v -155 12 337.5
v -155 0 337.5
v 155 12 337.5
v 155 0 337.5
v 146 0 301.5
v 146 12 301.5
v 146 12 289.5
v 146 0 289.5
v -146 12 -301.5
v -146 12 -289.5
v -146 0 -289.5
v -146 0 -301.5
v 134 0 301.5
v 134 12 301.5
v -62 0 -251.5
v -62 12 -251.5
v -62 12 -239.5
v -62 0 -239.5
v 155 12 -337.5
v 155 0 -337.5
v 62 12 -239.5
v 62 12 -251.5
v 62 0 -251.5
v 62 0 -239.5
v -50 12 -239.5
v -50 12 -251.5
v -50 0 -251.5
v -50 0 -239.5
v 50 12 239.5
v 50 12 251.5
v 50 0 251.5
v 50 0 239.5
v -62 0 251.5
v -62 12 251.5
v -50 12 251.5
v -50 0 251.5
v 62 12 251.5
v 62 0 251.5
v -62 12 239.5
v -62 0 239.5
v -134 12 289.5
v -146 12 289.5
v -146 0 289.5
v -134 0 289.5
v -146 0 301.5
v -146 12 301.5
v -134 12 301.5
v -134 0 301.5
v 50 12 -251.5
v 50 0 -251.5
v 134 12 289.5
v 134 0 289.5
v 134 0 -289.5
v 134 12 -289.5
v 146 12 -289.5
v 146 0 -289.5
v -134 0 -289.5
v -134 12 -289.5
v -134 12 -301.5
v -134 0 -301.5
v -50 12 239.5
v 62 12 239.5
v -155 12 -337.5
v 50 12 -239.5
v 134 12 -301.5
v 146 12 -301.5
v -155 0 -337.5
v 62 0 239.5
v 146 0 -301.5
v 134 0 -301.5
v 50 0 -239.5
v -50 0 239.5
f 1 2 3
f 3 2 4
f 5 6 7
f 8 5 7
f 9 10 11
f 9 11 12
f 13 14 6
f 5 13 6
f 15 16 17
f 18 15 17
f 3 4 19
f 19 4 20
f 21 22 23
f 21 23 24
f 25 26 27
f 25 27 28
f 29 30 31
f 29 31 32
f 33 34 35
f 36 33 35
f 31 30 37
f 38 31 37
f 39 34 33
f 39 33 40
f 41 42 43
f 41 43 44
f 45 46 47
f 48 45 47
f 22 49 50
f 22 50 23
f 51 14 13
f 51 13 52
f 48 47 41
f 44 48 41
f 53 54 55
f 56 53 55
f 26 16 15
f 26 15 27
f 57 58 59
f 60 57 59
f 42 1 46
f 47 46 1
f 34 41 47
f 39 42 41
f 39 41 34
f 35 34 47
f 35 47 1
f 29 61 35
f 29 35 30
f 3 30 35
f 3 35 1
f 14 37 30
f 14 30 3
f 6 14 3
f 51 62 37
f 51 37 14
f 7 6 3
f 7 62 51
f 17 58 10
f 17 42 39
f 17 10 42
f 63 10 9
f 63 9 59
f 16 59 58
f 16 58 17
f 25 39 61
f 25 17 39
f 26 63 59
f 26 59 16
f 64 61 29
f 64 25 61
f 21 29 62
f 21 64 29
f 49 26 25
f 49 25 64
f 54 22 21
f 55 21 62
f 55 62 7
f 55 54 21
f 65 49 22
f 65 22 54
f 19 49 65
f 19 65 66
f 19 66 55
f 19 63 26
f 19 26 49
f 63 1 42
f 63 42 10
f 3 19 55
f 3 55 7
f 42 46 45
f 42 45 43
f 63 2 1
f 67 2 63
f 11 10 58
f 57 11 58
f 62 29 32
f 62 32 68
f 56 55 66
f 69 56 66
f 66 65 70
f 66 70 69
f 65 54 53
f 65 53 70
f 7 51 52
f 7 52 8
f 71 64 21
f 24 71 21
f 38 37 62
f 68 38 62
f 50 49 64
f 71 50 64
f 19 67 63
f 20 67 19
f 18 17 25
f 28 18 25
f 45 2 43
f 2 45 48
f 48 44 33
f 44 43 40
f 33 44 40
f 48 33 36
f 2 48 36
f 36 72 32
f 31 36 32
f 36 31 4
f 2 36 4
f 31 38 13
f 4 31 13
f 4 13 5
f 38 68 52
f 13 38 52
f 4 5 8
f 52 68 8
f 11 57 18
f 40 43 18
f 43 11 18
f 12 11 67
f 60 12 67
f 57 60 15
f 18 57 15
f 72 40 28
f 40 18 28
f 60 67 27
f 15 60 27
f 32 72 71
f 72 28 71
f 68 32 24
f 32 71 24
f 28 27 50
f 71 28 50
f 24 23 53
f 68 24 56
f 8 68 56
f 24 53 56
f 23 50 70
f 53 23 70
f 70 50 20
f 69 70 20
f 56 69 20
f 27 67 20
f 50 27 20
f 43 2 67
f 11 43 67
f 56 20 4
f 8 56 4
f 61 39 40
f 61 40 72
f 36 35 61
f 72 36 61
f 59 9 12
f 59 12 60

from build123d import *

# Parameters (mm, degrees)
SKETCH1_W           = 310
SKETCH1_H           = 675
SKETCH1_W_2         = 300
SKETCH1_H_2         = 665
SKETCH1_W_3         = 260
SKETCH1_H_3         = 625
BOSS_EXTRUDE1_DEPTH = 12
SKETCH2_W           = 12
SKETCH2_H           = 12
CUT_EXTRUDE1_DEPTH  = 13
SKETCH3_W           = 12
SKETCH3_H           = 12
CUT_EXTRUDE2_DEPTH  = 13


with BuildPart() as part:
    # Sketch1 → Boss-Extrude1 (new body)
    with BuildSketch(Plane(origin=(0, 0, 0), x_dir=(1, 0, 0), z_dir=(0, 1, 0))):
        Rectangle(SKETCH1_W, SKETCH1_H)
        Rectangle(SKETCH1_W_2, SKETCH1_H_2, mode=Mode.SUBTRACT)
        Rectangle(SKETCH1_W_2, SKETCH1_H_2)
        Rectangle(SKETCH1_W_3, SKETCH1_H_3, mode=Mode.SUBTRACT)
        Rectangle(SKETCH1_W_3, SKETCH1_H_3)
    extrude(amount=BOSS_EXTRUDE1_DEPTH)

    # Sketch2 → Cut-Extrude1 (cut, through all)
    with BuildSketch(Plane(origin=(0, 12, 0), x_dir=(1, 0, 0), z_dir=(0, 1, 0))):
        with Locations((-140, -295.5)):
            Rectangle(SKETCH2_W, SKETCH2_H)
        with Locations((-140, 295.5)):
            Rectangle(SKETCH2_W, SKETCH2_H)
        with Locations((140, 295.5)):
            Rectangle(SKETCH2_W, SKETCH2_H)
        with Locations((140, -295.5)):
            Rectangle(SKETCH2_W, SKETCH2_H)
    extrude(amount=-CUT_EXTRUDE1_DEPTH, mode=Mode.SUBTRACT)

    # Sketch3 → Cut-Extrude2 (cut, through all)
    with BuildSketch(Plane(origin=(0, 12, 0), x_dir=(1, 0, 0), z_dir=(0, 1, 0))):
        with Locations((-56, -245.5)):
            Rectangle(SKETCH3_W, SKETCH3_H)
        with Locations((56, -245.5)):
            Rectangle(SKETCH3_W, SKETCH3_H)
    cut_extrude2 = extrude(amount=-CUT_EXTRUDE2_DEPTH, mode=Mode.SUBTRACT)

    # Mirror1: Cut-Extrude2 across plane
    add(cut_extrude2.mirror(Plane.XY), mode=Mode.SUBTRACT)


solid = part.part
